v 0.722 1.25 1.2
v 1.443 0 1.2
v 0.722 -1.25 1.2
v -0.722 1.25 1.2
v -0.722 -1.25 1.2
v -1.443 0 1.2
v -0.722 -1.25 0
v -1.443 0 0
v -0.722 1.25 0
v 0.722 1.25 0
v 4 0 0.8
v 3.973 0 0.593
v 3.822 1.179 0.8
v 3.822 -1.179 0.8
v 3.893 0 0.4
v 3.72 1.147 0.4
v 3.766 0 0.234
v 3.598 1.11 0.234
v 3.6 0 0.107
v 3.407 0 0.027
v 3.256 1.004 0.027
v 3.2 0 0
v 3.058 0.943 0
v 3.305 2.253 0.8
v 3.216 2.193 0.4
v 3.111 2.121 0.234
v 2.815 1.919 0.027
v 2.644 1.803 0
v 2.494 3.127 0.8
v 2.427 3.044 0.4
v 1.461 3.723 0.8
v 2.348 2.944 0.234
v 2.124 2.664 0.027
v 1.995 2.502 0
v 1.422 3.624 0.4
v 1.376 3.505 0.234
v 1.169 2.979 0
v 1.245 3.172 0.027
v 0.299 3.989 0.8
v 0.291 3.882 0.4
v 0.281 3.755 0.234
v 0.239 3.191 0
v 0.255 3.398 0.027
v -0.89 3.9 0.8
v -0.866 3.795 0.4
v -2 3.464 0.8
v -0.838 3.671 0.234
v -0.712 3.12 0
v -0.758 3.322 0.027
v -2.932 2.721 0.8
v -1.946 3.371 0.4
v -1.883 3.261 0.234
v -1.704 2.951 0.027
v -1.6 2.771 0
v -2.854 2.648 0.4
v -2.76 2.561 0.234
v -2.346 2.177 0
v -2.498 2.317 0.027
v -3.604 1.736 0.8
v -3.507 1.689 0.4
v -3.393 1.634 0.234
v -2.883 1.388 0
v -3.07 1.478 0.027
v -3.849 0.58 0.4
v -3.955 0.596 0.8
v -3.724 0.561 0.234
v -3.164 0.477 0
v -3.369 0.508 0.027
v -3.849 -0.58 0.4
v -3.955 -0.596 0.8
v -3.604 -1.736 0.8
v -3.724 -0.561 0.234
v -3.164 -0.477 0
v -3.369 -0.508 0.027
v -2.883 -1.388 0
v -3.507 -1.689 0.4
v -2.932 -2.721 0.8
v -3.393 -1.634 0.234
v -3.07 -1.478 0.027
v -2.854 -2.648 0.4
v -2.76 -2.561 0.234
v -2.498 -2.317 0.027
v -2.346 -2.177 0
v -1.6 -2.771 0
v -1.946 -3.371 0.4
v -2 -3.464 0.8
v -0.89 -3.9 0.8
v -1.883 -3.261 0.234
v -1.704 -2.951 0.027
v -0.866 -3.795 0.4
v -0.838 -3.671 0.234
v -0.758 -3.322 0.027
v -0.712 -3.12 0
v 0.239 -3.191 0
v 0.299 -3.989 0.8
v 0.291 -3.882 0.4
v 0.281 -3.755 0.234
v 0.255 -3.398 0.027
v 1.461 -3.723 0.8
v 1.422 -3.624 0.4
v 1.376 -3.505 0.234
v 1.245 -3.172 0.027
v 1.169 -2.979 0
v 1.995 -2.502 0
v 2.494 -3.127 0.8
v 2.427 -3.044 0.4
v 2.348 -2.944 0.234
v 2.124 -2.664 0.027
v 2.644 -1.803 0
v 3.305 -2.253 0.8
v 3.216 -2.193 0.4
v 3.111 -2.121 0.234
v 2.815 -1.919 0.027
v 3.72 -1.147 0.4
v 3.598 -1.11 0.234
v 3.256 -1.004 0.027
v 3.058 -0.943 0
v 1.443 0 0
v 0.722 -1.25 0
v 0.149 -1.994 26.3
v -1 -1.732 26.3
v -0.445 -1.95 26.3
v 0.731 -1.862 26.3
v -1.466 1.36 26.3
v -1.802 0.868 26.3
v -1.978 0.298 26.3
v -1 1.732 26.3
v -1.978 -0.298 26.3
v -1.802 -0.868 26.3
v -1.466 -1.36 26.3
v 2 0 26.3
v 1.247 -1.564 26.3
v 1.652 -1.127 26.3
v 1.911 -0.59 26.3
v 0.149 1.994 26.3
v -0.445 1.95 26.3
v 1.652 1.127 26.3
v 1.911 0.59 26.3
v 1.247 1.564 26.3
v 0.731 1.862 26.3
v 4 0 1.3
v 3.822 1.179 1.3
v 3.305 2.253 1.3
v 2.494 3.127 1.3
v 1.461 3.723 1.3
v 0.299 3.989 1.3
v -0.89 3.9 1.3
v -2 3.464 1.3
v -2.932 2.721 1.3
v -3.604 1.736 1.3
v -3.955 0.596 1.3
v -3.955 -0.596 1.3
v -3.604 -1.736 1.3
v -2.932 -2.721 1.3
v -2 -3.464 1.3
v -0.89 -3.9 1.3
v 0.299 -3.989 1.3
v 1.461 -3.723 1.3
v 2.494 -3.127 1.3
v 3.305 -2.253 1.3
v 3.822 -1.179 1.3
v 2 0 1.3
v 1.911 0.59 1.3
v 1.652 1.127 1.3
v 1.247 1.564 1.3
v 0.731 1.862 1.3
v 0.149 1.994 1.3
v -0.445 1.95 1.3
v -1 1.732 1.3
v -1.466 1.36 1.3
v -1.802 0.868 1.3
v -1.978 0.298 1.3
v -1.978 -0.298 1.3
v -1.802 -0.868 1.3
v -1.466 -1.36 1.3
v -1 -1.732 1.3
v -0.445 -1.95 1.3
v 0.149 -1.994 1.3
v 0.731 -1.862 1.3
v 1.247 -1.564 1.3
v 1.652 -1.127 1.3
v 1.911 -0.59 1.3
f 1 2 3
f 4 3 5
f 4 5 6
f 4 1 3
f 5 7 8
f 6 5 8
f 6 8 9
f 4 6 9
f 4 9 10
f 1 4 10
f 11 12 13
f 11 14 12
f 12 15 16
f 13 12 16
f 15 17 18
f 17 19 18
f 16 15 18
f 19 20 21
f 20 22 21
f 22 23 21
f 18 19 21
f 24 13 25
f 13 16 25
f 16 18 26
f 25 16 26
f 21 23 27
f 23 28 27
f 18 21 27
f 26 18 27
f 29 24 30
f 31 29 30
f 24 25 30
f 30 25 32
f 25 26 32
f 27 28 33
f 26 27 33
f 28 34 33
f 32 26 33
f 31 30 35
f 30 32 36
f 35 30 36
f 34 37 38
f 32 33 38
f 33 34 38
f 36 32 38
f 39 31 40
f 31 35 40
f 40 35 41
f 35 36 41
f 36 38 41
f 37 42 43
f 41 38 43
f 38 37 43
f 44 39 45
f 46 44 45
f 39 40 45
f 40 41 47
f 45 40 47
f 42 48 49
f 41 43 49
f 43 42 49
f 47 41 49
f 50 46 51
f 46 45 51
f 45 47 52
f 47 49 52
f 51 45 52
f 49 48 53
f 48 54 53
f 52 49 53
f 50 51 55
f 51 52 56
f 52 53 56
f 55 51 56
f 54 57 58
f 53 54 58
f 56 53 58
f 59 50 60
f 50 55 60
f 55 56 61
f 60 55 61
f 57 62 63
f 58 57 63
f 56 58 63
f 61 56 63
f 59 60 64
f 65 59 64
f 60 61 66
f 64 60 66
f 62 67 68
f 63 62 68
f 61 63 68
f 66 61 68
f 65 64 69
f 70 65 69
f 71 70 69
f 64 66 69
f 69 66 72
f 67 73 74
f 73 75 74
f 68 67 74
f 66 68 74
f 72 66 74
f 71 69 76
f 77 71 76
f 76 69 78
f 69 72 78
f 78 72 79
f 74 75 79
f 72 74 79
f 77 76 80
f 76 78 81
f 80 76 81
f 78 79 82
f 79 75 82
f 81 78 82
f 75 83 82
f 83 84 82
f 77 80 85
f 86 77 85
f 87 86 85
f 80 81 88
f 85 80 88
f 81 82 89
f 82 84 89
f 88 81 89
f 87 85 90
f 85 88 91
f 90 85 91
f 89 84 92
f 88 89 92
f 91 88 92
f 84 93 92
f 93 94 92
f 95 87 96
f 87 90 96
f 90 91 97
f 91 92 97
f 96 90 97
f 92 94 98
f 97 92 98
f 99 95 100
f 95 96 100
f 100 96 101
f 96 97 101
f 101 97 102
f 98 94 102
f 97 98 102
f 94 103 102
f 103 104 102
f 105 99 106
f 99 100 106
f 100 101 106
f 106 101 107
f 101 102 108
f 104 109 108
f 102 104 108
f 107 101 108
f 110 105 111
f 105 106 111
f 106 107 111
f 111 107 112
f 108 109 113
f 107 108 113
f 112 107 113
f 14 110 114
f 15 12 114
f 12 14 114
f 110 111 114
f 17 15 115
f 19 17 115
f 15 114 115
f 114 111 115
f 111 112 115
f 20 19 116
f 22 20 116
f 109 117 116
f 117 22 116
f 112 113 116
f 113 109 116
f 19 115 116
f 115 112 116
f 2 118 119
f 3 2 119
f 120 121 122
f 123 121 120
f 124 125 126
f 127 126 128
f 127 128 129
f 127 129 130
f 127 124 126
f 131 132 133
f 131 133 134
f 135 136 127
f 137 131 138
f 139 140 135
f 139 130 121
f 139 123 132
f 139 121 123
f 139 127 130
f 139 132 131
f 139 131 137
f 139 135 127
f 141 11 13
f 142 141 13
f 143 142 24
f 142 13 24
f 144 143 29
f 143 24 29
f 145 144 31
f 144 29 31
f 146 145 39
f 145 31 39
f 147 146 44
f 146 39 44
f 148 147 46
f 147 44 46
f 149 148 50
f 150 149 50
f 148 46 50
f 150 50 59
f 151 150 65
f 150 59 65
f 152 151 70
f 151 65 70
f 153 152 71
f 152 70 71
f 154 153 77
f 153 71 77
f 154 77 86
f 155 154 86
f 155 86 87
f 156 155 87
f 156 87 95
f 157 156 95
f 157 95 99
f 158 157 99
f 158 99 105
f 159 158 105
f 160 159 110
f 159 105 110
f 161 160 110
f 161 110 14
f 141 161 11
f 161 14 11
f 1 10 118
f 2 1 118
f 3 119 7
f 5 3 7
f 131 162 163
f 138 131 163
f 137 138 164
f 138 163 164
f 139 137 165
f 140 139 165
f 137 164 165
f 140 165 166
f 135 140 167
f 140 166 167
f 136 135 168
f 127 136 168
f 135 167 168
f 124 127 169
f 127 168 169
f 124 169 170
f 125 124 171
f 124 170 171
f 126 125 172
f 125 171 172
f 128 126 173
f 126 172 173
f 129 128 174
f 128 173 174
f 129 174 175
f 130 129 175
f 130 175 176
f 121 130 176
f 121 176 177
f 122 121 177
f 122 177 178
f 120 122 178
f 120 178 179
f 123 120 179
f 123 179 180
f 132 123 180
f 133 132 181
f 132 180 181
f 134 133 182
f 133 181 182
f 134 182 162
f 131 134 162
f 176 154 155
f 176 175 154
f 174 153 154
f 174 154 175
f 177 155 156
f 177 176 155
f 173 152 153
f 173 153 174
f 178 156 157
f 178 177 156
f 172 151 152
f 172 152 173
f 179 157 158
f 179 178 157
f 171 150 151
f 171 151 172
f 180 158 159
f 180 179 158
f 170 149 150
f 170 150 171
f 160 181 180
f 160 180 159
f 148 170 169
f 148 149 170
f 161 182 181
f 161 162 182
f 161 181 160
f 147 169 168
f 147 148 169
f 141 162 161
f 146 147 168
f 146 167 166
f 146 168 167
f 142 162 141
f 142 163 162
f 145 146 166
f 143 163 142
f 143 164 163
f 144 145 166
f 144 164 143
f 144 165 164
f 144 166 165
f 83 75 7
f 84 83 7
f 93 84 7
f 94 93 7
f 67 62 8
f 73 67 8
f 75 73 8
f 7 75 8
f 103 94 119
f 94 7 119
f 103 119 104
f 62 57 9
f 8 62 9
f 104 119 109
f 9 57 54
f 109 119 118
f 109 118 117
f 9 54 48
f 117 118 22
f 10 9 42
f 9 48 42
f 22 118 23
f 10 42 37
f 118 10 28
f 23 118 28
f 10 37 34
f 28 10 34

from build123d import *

# Parameters (mm, degrees)
SKETCH_1_R          = 4
EXTRUDE_1_DEPTH     = 1.3
SKETCH_2_R          = 2
EXTRUDE_2_DEPTH     = 25
CUT_EXTRUDE_1_DEPTH = 1.2
FILLET_1_R          = 0.8


with BuildPart() as part:
    # 草图1 → 凸台-拉伸1 (new body)
    with BuildSketch(Plane.XY):
        Circle(SKETCH_1_R)
    extrude(amount=EXTRUDE_1_DEPTH)

    # 草图2 → 凸台-拉伸2 (add)
    with BuildSketch(Plane.XY.offset(1.3)):
        Circle(SKETCH_2_R)
    extrude(amount=EXTRUDE_2_DEPTH)

    # 草图3 → 切除-拉伸1 (cut)
    with BuildSketch(Plane(origin=(0, 0, 0), x_dir=(-1, 0, 0), z_dir=(0, 0, -1))):
        Polygon((-0.721687836, 1.25), (-1.443375673, 0), (-0.721687836, -1.25), (0.721687836, -1.25), (1.443375673, 0), (0.721687836, 1.25), align=None)
    extrude(amount=-CUT_EXTRUDE_1_DEPTH, mode=Mode.SUBTRACT)

    # 圆角1
    fillet_1_edges = [part.edges().sort_by_distance(p)[0] for p in [
        (-4, 0, 0),
    ]]
    fillet(fillet_1_edges, radius=FILLET_1_R)


solid = part.part
